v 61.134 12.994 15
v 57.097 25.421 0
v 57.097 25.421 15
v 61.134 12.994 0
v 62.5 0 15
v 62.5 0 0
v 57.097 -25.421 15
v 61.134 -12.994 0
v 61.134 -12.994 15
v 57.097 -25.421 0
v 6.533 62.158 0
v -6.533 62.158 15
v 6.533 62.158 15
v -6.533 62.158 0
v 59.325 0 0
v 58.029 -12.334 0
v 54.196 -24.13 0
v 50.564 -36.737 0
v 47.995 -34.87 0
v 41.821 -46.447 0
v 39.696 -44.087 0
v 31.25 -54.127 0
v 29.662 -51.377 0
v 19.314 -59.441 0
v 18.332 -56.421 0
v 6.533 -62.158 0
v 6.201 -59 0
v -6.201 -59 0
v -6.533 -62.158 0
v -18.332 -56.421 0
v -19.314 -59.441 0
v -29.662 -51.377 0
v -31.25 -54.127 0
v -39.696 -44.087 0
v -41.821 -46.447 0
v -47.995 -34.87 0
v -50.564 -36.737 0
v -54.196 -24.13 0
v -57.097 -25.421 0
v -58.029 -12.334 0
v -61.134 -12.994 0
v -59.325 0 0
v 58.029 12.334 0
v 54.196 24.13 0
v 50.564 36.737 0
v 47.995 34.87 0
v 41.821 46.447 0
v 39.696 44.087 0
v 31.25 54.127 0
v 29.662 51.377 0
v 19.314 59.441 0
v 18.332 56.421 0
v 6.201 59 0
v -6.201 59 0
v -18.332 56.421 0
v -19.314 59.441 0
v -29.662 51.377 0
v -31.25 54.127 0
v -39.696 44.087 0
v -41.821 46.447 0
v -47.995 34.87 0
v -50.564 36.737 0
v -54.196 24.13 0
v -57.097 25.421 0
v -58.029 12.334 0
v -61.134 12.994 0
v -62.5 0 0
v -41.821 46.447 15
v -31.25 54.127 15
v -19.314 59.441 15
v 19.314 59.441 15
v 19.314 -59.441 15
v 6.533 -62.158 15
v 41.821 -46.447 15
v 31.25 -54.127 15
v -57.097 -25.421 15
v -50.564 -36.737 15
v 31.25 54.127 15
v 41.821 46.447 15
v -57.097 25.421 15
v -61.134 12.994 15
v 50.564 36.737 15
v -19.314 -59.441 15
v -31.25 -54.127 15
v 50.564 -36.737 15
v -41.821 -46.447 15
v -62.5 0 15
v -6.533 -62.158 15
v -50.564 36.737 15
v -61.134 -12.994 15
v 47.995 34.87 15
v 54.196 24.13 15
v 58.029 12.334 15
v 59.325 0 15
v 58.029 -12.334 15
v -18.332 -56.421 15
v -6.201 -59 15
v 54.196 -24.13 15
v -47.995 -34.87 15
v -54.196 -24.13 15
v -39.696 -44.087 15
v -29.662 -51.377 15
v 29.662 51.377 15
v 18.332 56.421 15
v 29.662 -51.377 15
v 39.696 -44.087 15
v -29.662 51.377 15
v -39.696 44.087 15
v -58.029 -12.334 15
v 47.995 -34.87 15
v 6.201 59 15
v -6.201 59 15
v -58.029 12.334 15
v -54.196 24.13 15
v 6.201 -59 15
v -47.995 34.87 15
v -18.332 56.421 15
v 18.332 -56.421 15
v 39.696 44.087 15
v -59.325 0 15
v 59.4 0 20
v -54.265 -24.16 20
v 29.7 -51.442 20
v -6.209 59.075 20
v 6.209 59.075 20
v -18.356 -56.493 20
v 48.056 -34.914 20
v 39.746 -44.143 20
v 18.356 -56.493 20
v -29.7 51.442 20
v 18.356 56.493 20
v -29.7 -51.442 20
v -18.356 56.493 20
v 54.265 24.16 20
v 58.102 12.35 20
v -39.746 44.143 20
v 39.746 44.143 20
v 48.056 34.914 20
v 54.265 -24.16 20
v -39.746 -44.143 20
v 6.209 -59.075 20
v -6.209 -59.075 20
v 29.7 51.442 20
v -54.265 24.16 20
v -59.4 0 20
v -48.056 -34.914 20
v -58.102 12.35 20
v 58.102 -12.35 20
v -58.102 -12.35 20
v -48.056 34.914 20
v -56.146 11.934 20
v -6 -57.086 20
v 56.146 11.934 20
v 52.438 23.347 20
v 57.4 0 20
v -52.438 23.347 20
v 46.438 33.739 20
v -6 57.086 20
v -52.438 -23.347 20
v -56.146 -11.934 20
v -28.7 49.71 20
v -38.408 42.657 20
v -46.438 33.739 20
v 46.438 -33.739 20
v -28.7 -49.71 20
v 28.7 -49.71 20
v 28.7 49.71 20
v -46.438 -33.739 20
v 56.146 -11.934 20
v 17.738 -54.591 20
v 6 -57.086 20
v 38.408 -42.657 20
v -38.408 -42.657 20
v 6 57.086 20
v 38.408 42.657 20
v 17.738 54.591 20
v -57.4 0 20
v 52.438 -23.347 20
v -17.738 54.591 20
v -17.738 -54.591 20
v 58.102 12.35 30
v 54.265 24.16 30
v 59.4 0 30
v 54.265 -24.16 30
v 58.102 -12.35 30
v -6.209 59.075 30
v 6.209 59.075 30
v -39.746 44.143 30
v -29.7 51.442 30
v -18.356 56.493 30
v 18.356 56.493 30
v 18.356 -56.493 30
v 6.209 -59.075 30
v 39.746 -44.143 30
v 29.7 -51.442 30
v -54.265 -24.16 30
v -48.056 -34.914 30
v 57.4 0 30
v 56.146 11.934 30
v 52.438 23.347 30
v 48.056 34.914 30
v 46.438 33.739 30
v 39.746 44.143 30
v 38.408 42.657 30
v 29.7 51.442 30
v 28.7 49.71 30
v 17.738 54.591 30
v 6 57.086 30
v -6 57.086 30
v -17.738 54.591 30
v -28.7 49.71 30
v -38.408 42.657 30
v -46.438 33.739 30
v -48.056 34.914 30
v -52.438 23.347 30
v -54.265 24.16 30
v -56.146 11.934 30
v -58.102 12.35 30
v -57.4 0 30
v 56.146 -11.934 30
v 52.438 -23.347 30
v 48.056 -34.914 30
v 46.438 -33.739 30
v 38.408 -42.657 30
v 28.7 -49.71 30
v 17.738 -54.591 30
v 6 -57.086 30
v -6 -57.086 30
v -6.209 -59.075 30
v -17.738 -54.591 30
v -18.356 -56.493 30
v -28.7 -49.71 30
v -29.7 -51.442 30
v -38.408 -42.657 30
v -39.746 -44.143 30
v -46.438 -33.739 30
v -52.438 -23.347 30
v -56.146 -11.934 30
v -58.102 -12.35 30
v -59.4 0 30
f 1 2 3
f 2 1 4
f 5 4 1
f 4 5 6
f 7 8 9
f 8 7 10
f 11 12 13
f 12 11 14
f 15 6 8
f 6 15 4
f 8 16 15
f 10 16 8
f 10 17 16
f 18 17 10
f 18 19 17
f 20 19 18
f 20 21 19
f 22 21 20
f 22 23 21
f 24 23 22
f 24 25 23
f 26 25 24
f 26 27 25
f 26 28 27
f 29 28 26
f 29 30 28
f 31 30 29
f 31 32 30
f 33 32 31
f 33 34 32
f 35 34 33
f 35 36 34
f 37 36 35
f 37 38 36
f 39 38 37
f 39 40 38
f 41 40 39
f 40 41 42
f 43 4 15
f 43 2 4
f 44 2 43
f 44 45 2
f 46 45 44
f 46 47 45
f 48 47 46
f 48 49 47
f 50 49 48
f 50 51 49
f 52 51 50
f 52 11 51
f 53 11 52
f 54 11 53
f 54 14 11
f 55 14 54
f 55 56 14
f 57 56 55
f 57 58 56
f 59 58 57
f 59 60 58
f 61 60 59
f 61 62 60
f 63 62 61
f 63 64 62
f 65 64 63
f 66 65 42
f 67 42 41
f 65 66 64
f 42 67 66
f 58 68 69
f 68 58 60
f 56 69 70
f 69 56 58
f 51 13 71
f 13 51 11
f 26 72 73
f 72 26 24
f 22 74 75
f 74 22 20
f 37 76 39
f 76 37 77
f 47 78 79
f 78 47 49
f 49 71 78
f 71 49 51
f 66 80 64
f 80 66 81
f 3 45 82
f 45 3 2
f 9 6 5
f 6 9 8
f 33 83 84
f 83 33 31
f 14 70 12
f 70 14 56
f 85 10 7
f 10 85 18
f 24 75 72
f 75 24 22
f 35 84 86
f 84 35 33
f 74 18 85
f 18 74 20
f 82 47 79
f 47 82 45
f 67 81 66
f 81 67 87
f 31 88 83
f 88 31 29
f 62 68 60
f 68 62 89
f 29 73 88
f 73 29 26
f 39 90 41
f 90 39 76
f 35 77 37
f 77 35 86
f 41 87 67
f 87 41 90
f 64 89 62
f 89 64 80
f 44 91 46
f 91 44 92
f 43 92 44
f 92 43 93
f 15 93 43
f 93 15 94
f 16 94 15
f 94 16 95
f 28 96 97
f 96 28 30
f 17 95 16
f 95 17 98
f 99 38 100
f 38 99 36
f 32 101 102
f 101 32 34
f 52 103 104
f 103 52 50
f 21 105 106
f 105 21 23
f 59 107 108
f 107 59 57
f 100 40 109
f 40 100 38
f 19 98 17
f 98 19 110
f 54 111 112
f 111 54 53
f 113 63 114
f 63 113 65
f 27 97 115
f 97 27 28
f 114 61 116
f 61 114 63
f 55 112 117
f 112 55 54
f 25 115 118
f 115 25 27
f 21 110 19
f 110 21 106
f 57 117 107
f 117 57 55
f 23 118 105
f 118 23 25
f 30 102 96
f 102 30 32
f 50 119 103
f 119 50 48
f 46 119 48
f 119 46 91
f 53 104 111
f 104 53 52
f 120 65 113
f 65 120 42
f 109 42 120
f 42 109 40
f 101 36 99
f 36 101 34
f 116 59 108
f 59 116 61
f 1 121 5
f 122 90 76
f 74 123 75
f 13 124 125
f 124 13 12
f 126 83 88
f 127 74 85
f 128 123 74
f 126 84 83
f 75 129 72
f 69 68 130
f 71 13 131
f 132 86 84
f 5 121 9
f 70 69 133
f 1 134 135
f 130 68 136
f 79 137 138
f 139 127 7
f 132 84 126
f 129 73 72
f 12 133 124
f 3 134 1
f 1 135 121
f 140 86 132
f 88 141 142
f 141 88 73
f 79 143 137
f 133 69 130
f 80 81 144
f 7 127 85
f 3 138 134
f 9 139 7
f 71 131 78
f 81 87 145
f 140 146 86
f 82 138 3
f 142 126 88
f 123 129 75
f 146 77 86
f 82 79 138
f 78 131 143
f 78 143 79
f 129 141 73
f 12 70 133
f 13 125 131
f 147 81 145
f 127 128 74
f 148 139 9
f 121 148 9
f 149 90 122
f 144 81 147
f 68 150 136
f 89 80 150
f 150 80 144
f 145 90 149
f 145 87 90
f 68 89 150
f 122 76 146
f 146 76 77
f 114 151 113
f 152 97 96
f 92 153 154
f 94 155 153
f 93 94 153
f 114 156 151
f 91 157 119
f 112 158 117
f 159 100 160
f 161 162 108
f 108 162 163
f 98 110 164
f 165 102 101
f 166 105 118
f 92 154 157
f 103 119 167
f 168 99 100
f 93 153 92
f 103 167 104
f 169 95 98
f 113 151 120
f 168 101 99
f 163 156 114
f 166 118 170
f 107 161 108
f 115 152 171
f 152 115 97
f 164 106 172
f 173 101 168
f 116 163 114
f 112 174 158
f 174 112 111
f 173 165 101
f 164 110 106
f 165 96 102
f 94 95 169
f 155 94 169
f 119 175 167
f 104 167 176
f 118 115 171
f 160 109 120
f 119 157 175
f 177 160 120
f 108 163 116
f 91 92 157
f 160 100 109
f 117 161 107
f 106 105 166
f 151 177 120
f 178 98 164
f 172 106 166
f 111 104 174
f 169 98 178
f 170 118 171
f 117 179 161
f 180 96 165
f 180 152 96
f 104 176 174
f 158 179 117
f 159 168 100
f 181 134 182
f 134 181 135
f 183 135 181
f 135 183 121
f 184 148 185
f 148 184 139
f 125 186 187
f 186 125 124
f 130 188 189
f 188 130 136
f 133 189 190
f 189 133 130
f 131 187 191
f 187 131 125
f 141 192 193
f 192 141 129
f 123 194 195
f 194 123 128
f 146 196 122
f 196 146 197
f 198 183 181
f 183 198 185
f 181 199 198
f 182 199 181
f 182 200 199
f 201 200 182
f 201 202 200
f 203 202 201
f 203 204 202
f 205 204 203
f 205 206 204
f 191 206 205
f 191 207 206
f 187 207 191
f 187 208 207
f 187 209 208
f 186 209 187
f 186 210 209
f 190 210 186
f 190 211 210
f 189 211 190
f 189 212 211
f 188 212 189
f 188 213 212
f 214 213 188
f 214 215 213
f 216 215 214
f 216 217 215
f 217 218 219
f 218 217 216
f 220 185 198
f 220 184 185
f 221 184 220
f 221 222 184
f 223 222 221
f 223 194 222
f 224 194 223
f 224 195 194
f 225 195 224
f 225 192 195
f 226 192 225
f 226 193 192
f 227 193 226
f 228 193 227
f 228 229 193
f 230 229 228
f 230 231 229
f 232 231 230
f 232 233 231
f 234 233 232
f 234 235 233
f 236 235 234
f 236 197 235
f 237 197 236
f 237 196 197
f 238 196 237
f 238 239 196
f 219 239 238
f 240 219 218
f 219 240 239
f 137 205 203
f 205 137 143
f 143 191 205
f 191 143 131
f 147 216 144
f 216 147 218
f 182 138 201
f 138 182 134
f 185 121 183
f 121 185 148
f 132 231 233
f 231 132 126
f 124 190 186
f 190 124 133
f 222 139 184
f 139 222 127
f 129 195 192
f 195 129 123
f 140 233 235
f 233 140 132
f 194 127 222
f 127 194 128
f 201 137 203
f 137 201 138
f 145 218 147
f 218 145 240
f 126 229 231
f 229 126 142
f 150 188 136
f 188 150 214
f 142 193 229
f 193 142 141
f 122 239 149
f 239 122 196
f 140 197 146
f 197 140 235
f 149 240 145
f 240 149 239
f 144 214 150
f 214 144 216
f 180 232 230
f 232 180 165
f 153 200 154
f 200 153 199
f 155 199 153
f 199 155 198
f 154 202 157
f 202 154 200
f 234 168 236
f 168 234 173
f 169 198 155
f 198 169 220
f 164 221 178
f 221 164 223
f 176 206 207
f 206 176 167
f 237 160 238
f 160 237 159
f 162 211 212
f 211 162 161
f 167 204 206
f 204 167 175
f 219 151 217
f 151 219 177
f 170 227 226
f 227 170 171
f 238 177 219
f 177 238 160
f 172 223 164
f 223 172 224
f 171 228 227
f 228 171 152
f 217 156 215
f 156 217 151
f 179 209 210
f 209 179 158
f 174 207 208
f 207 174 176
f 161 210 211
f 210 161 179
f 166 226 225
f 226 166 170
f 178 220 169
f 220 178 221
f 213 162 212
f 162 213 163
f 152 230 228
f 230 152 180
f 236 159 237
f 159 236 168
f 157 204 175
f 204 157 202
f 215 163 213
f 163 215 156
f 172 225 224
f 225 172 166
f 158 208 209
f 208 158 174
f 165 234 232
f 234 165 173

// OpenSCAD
/*
French Weather Station 125mm Pipe Length Fix
Remixed for https://www.thingiverse.com/thing:5990046

Created December 13, 2023
Modified December 13, 2023

Needed to increase 150mm high by 15mm so large pipe needent be reprinted
*/

skinny_od = 118.2 + 0.6; // same as funnel fitting OD, just tighter fit
wide_id = 118.2 + 0.45; // should fit outside funnel fitting OD
skinny_id = skinny_od - 4; // can be thin here
wide_od = 125;

wide_h = 15; // effective increase in height -- needed for OG 150 pipe height
taper_h = 5;
skinny_h = 10;

$fs = 0.2;

module pipe_fix() {
    // wide end
    difference() {
        cylinder(d=wide_od, h=wide_h);
        cylinder(d=wide_id, h=wide_h);
    }

    // taper
    translate([0, 0, wide_h])
    difference() {
        cylinder(d1=wide_od, d2=skinny_od, h=taper_h);
        cylinder(d1=wide_id, d2=skinny_id, h=taper_h);
    }

    // skinny end
    translate([0, 0, wide_h + taper_h])
    difference() {
        cylinder(d=skinny_od, h=skinny_h);
        cylinder(d=skinny_id, h=skinny_h);
    }
}

test_h = 2;
module wide_test_ring() {
    // wide
    difference() {
        cylinder(d=wide_od, h=test_h);
        cylinder(d=wide_id, h=test_h);
    }
}

module skinny_test_ring() {
    // skinny
    difference() {
        cylinder(d=skinny_od, h=test_h * 2);
        cylinder(d=skinny_id, h=test_h * 2);
    }
}

// wide_test_ring();
// skinny_test_ring();

pipe_fix();
